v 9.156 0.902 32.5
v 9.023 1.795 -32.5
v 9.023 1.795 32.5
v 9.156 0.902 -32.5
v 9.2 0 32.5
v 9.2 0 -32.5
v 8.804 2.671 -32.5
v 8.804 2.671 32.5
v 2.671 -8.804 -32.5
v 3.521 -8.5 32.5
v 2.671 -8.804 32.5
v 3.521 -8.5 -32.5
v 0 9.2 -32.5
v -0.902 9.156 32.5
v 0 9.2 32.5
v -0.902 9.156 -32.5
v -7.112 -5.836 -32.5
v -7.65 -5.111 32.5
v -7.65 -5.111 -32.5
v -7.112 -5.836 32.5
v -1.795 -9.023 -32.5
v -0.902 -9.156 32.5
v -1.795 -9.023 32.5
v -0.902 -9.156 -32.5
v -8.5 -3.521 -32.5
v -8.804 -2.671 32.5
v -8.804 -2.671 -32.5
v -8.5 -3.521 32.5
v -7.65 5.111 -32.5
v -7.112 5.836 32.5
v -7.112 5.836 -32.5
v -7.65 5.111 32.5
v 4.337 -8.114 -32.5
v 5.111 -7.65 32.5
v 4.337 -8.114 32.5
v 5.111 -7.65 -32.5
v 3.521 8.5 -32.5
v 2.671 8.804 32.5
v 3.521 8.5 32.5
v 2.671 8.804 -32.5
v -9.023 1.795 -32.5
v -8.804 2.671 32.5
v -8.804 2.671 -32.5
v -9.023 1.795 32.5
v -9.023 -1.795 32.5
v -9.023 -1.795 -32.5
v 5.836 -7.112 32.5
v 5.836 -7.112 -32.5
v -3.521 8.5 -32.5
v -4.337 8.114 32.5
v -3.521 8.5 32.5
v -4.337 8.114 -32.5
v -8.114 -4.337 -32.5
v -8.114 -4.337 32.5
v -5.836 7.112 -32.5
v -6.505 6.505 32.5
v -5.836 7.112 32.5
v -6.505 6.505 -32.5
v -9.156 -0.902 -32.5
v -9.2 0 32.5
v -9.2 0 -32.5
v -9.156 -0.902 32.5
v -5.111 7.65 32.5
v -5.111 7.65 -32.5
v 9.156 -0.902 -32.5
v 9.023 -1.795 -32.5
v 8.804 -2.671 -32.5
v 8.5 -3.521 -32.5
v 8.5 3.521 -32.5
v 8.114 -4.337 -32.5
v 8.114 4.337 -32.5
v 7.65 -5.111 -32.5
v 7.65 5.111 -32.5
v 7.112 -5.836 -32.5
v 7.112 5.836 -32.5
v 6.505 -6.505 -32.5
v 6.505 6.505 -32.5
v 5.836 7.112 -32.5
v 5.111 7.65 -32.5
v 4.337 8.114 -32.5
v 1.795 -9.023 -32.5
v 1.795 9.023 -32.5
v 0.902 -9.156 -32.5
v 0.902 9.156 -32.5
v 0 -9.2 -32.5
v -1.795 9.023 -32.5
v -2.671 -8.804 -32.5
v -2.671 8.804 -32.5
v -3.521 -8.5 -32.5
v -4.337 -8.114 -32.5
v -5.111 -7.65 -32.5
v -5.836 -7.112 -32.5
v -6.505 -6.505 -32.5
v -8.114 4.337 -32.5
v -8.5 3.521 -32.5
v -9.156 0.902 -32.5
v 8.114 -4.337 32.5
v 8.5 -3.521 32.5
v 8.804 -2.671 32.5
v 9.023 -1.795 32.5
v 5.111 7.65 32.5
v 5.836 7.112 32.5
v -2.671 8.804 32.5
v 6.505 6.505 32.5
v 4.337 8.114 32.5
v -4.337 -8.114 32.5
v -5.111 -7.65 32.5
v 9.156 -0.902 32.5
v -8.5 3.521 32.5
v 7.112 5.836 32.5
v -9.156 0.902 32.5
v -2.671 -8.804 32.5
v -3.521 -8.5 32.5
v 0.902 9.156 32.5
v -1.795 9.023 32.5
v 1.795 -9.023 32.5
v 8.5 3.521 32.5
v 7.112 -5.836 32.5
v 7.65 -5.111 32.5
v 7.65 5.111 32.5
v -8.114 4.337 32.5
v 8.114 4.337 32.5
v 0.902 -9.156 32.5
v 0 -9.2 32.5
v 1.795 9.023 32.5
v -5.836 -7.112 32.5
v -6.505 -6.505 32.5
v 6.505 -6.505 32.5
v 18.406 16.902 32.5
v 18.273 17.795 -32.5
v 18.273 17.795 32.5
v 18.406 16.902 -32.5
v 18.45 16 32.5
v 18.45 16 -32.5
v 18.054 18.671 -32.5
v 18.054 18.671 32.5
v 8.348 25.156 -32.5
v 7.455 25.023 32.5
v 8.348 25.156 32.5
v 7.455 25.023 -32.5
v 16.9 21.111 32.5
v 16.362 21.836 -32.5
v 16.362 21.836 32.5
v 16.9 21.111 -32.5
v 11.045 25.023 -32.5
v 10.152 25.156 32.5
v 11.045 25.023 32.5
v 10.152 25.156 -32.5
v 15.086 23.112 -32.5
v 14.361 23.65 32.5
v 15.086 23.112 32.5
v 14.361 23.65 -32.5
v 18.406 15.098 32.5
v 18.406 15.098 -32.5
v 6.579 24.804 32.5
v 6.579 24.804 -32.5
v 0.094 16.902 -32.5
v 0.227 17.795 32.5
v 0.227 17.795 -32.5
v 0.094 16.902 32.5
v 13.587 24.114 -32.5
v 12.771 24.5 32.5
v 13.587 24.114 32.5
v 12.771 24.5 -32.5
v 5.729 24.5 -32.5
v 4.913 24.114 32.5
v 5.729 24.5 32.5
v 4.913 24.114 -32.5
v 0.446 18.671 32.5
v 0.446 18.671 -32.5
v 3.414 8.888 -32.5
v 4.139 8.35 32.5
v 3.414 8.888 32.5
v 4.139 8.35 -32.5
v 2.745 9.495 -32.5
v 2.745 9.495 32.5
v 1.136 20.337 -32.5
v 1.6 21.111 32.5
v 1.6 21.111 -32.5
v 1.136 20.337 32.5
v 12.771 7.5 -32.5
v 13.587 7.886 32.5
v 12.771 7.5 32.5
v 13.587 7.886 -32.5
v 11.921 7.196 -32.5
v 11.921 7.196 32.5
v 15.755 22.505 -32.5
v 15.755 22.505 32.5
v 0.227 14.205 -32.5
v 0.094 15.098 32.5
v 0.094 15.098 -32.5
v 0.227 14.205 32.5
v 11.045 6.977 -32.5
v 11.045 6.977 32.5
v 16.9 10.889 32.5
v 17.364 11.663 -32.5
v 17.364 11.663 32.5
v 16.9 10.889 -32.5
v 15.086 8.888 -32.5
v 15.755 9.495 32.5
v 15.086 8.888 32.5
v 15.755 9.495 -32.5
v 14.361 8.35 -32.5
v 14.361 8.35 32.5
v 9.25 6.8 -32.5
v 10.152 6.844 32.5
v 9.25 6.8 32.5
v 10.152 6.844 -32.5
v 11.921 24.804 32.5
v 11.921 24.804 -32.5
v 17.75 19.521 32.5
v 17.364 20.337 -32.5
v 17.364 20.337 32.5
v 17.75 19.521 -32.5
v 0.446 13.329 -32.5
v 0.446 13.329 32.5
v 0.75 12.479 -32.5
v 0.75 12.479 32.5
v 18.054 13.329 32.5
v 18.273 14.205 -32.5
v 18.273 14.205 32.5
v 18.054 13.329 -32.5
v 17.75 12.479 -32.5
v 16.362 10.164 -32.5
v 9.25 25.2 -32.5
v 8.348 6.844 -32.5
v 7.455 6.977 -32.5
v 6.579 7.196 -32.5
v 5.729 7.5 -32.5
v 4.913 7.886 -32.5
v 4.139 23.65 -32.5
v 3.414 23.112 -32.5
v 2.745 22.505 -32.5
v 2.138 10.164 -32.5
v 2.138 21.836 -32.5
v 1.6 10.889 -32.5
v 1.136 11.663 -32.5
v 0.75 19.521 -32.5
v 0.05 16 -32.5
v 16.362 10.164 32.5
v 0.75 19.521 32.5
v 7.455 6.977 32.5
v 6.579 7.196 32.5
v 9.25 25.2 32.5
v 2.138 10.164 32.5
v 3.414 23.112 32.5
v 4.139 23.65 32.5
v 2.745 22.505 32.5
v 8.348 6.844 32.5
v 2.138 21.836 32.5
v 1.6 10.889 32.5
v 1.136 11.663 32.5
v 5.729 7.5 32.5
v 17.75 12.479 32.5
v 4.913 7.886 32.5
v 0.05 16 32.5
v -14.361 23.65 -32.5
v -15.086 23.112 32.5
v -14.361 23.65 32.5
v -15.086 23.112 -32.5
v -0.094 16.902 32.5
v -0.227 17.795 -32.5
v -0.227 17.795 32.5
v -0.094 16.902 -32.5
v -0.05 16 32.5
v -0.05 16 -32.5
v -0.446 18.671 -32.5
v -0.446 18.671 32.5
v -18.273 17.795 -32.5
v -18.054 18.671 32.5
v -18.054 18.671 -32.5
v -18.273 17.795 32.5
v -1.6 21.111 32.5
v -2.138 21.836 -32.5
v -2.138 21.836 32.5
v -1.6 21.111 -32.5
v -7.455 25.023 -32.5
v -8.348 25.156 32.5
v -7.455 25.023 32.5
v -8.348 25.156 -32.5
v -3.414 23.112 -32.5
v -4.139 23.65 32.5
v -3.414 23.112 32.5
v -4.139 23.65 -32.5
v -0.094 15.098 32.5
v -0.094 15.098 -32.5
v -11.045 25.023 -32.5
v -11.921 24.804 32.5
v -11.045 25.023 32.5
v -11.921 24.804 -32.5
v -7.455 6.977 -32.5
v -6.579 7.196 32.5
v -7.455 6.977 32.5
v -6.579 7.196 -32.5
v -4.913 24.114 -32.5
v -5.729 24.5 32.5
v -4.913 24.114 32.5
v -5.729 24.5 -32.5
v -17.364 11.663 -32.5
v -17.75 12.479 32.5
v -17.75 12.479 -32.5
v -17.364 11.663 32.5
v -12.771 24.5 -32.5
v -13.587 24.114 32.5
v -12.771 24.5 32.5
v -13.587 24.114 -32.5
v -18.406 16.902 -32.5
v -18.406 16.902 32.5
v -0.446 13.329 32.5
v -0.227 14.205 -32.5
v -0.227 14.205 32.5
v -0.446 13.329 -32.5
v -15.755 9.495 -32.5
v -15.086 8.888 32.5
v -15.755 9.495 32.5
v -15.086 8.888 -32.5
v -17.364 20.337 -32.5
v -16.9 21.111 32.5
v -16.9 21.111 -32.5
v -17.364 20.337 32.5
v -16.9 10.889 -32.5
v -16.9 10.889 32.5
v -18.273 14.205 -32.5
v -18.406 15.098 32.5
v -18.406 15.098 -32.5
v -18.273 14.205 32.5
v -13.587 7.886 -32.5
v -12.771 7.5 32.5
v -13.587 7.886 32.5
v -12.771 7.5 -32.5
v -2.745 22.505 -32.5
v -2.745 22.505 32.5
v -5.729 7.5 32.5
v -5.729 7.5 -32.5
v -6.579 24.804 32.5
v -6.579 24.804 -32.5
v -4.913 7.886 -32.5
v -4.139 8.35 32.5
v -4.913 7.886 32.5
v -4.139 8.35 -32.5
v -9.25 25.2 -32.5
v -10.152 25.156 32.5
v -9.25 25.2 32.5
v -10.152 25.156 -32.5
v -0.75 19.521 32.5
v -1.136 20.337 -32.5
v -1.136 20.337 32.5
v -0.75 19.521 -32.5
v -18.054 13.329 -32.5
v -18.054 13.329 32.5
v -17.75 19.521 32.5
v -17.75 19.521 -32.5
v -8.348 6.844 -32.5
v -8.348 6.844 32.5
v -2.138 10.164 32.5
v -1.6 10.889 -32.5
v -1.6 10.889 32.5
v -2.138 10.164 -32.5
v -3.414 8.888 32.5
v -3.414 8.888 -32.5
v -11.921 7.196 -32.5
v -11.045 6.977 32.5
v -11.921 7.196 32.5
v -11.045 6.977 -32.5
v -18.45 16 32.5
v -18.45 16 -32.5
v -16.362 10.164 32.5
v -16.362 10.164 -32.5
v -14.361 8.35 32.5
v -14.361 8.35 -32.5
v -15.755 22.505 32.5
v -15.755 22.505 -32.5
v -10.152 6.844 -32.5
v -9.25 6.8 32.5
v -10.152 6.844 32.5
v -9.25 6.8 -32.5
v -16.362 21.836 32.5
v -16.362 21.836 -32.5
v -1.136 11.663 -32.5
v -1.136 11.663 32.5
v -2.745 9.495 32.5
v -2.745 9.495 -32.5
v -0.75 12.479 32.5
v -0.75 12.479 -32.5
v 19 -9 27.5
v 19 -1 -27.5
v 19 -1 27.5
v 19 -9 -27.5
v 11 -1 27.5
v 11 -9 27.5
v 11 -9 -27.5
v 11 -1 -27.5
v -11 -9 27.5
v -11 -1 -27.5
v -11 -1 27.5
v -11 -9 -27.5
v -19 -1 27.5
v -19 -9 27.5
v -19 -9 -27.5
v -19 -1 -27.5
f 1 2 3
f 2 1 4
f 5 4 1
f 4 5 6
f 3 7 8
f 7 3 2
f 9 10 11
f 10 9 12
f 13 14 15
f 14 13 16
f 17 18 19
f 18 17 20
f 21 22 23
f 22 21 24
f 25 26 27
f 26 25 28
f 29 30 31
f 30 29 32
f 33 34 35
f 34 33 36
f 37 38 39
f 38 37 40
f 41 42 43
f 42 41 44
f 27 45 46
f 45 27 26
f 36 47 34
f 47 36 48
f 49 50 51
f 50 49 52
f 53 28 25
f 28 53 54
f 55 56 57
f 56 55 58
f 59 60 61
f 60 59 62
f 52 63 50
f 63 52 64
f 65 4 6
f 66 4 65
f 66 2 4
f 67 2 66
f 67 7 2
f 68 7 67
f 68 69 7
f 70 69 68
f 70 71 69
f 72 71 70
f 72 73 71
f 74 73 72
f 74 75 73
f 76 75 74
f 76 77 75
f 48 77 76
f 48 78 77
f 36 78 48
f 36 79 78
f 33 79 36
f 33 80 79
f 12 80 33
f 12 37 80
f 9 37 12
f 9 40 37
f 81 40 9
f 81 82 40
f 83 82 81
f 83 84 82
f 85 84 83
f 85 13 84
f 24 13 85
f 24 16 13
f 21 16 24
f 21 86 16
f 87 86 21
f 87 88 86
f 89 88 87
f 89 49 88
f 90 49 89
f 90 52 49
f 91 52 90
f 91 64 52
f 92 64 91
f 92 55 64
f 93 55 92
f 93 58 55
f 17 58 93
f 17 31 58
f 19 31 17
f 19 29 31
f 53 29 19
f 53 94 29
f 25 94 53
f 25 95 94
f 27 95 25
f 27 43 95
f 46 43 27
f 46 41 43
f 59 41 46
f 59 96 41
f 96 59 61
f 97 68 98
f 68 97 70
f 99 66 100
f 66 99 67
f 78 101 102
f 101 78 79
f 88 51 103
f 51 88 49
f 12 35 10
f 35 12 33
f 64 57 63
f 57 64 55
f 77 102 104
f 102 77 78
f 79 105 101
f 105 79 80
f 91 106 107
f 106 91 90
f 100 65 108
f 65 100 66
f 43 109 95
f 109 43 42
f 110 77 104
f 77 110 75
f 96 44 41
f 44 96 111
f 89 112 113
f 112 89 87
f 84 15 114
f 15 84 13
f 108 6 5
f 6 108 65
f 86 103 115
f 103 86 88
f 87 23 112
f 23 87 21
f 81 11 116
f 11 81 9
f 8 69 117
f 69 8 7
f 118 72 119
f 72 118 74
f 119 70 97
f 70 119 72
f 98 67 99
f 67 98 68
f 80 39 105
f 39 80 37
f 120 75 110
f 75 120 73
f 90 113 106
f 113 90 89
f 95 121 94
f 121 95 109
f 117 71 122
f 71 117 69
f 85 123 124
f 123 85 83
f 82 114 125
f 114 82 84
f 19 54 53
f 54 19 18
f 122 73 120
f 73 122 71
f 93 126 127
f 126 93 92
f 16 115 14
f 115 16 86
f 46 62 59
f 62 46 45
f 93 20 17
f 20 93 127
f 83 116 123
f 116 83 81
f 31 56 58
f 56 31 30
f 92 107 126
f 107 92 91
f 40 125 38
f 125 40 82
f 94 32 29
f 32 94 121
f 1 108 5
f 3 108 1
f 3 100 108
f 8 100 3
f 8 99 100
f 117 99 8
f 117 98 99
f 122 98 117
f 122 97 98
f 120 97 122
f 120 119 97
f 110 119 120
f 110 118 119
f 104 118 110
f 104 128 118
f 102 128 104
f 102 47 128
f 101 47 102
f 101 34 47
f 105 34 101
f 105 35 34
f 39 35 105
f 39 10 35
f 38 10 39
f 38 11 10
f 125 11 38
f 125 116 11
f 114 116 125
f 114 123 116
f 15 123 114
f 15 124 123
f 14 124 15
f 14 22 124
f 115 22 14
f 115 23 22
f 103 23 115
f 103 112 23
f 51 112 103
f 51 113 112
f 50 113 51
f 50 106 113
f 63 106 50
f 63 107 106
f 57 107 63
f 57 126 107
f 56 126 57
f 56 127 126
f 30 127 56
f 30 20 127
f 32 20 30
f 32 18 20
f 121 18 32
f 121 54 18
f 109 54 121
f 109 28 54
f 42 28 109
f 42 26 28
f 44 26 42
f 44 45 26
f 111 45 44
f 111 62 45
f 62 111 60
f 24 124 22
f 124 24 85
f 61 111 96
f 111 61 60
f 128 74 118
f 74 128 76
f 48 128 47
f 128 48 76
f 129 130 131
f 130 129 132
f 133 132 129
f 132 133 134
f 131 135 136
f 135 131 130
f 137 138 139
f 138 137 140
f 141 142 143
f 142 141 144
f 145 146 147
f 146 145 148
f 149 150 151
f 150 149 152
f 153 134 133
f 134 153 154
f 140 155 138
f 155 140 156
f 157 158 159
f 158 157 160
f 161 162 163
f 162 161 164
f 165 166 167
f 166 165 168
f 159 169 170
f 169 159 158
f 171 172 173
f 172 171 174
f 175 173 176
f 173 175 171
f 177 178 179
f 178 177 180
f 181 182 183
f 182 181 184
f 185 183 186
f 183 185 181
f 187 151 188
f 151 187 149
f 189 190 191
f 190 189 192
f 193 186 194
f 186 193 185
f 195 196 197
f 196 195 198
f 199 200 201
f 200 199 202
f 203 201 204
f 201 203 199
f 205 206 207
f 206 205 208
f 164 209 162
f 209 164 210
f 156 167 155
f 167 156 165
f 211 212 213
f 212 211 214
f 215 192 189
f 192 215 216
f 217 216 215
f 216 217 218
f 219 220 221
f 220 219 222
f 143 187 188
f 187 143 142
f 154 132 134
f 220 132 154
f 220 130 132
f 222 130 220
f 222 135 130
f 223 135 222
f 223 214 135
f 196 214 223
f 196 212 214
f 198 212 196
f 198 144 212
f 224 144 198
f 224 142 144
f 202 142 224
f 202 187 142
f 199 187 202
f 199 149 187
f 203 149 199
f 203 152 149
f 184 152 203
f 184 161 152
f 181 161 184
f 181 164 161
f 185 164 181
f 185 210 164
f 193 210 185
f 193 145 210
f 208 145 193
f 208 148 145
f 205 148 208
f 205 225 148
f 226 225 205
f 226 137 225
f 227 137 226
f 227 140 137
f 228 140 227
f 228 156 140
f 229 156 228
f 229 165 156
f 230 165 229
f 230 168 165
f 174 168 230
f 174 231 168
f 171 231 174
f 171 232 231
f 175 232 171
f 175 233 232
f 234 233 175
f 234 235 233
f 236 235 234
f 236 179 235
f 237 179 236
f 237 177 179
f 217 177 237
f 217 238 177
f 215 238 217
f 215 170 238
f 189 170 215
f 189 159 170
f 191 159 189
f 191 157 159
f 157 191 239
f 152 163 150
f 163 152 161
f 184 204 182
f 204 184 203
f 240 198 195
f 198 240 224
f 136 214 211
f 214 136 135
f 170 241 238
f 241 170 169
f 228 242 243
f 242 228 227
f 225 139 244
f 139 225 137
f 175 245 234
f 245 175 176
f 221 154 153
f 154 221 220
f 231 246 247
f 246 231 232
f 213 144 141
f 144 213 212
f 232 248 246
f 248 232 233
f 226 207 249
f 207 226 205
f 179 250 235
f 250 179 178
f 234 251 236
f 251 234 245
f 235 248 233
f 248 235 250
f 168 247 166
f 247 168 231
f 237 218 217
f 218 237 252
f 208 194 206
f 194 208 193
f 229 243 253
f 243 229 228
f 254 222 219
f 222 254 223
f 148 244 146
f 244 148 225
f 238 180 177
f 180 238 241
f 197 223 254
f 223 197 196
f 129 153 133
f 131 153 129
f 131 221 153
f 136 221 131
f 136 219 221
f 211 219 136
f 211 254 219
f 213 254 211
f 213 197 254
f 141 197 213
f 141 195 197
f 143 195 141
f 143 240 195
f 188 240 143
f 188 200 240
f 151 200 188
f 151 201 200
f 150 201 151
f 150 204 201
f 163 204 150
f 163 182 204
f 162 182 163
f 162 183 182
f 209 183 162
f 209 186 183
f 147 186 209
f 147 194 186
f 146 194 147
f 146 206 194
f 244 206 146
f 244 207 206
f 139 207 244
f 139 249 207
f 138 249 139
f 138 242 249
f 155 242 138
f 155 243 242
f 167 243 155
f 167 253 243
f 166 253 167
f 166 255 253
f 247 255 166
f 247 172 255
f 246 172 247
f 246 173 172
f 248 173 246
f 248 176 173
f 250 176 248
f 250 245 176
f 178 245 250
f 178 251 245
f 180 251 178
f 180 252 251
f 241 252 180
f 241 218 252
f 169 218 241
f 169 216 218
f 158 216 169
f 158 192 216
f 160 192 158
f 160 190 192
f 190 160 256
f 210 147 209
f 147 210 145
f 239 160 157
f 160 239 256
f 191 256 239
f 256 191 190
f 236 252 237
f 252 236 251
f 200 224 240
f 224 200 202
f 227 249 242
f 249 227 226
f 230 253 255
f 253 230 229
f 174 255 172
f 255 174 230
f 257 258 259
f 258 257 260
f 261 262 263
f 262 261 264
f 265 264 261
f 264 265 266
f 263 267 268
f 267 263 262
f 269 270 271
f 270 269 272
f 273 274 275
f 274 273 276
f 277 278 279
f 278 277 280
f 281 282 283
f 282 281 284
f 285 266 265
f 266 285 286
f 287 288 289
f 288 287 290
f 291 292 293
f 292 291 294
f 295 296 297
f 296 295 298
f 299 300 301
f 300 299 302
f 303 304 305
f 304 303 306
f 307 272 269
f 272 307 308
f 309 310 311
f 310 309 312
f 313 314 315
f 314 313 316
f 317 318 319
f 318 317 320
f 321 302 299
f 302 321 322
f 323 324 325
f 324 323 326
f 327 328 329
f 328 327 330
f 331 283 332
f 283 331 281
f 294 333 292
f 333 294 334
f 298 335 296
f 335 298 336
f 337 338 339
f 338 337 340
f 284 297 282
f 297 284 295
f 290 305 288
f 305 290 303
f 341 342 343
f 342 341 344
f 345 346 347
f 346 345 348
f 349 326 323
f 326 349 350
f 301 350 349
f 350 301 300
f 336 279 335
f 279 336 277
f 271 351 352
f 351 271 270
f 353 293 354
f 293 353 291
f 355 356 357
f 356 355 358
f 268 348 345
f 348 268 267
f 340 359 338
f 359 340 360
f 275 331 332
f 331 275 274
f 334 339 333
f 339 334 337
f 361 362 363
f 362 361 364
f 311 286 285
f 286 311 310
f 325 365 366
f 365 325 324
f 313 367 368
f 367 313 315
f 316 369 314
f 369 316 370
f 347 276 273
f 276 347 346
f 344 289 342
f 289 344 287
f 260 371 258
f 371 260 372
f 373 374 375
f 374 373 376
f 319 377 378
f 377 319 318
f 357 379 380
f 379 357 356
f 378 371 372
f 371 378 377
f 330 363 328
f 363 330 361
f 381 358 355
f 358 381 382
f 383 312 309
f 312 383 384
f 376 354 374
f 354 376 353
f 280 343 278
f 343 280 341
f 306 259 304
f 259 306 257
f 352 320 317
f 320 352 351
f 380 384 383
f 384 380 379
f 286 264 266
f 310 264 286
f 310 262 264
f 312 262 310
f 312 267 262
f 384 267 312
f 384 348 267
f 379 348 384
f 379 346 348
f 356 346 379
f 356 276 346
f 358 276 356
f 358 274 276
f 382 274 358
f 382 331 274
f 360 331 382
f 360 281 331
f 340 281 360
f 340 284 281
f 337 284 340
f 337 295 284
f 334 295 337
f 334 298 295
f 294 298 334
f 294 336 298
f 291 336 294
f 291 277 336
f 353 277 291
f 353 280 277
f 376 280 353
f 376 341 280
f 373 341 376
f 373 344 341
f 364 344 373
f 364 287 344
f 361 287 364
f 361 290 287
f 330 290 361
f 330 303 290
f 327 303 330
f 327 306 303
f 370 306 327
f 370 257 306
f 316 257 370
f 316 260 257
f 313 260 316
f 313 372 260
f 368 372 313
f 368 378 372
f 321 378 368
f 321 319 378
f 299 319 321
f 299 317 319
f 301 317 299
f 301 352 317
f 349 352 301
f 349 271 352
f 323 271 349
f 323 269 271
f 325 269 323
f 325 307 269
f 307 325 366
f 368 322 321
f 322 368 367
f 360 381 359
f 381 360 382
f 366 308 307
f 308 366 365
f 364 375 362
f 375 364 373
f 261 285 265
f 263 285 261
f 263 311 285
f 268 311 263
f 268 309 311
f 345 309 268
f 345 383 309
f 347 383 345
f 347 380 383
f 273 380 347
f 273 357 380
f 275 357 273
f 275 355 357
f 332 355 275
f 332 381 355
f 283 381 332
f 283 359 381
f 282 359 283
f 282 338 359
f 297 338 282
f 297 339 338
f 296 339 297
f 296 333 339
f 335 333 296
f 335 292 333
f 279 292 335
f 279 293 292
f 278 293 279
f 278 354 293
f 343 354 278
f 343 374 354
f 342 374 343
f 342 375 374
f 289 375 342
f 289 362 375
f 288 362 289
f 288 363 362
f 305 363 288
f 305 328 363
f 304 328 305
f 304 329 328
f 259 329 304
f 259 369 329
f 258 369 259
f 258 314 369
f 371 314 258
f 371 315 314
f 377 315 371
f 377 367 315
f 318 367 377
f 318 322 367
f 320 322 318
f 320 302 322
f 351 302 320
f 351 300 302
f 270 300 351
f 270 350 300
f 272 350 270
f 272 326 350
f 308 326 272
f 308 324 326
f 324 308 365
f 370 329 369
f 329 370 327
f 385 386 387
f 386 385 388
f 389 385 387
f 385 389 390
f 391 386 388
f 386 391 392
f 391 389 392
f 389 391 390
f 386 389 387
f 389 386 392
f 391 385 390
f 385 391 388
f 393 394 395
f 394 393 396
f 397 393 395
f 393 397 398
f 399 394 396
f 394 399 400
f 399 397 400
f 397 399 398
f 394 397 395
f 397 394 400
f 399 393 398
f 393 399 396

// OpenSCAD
// file: library.scad
// Аккумулятор 18650

module akk18650() {
  cylinder(d=18.4, h=65, center=true);
  
}
// main file
include <library.scad>

$fn = 64;

  akk18650();
  translate([ 9.25, 16, 0]) akk18650();
  translate([-9.25, 16, 0]) akk18650();


// Магниты
translate([ 15, -5, 0]) cube([8,8,55], center=true);
translate([-15, -5, 0]) cube([8,8,55], center=true);

// Корпус

w_t = 1.0;  // Толщина стенки корпуса.

if(false) {

difference() {

  translate([0, 0, 2])
  linear_extrude(height = 71.0, center=true) {
    hull() {
      translate([ 18.5, 0, 0]) circle(d = 19 + 2*w_t);
      translate([-18.5, 0, 0]) circle(d = 19 + 2*w_t);
    }
  }

  translate([0, 0, 5]) linear_extrude(height = 75.0, center=true) {
    translate([ 18.5, 0, 0]) circle(d = 19);
    translate([    0, 0, 0]) circle(d = 19);
    translate([-18.5, 0, 0]) circle(d = 19);
  }
  translate([0, 0, 5]) cube([30,10,75], center=true);
  
  translate([0, 0, 38]) linear_extrude(height = 8.0, center=true) {
    hull() {
      translate([ 18.5, 0, 0]) circle(d = 19);
      translate([-18.5, 0, 0]) circle(d = 19);
    }
  }

  /*translate([0,50,0]) cube([100,100,100], center=true);*/

}


}
